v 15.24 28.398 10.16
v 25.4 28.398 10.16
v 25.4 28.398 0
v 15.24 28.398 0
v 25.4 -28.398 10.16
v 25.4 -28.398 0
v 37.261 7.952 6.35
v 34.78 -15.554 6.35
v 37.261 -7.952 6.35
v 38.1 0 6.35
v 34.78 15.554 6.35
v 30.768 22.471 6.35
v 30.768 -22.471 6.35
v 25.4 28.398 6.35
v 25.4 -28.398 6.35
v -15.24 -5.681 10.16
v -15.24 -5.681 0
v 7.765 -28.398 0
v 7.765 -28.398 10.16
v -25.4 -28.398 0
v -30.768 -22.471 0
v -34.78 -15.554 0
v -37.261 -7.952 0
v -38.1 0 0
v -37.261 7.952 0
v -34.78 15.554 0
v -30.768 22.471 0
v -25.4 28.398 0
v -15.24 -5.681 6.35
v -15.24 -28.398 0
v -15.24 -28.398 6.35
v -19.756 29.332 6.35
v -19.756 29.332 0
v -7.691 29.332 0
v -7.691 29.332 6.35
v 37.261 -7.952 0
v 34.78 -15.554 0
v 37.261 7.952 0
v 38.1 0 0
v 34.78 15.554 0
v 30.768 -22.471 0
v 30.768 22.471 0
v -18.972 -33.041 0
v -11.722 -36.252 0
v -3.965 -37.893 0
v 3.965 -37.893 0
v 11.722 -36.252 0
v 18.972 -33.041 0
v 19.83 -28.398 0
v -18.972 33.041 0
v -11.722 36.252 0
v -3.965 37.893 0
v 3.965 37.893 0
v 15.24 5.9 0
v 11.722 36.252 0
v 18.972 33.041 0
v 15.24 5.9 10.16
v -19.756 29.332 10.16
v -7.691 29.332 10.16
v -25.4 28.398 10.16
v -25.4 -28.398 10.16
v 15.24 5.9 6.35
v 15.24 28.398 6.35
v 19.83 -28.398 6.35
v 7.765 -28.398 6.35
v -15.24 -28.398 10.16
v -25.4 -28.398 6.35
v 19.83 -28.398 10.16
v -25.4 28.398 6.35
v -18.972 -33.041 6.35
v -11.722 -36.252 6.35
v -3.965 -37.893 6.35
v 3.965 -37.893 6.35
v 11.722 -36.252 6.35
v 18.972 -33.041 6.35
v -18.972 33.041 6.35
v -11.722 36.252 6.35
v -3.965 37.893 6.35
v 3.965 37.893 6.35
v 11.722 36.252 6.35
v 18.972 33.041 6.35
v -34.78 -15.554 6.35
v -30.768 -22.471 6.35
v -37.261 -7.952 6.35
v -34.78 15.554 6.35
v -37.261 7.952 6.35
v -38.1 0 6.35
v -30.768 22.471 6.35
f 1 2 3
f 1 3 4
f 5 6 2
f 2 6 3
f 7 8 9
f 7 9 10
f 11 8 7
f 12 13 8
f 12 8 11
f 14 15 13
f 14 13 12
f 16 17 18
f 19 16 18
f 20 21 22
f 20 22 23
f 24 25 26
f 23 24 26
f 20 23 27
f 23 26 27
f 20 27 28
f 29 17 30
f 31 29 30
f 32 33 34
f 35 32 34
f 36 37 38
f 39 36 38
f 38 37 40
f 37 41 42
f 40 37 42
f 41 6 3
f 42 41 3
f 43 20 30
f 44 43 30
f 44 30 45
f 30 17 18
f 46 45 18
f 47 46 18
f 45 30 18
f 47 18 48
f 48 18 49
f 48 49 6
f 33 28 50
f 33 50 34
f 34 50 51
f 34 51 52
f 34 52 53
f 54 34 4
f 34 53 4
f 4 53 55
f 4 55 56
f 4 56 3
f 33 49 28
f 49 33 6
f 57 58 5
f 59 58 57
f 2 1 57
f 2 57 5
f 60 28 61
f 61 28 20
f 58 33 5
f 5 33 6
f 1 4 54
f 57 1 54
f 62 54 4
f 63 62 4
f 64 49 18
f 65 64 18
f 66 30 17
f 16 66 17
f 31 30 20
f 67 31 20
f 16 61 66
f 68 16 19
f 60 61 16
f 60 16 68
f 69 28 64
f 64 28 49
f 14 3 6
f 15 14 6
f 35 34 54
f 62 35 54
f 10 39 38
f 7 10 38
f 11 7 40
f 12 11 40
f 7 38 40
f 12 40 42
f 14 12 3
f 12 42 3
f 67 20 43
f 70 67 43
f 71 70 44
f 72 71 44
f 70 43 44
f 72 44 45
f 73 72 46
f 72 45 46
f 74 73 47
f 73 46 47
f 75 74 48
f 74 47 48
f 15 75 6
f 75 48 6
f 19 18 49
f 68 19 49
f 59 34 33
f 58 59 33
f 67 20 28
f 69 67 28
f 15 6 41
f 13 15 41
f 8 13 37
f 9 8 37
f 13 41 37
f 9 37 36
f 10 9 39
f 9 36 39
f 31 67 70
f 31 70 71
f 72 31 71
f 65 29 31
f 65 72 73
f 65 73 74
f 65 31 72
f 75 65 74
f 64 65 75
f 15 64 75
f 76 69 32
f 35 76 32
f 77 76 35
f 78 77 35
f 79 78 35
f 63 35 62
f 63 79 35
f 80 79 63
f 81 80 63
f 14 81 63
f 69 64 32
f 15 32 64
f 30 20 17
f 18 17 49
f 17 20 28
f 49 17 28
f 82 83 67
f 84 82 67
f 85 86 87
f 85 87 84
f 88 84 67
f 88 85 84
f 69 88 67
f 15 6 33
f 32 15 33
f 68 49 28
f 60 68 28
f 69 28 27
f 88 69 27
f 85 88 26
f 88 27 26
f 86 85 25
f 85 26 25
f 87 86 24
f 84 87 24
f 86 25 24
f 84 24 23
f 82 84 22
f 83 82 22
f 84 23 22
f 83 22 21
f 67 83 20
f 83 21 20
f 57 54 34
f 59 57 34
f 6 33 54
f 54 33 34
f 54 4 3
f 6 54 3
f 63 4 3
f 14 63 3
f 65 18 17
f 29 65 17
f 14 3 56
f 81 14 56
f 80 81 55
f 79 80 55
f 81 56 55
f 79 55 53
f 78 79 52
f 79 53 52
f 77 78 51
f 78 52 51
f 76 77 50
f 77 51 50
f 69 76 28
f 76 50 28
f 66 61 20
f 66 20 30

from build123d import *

# Parameters (mm, degrees)
F1_DEPTH = 10.16
F2_DEPTH = 6.35


with BuildPart() as f1:
    # F0 (on Top) → F1 (new body)
    with BuildSketch(Plane.XY):
        Polygon((25.4, -28.398063), (25.4, 28.398063), (15.24, 28.398063), (15.24, 5.900018), (-7.690813, 29.331759), (-19.755813, 29.331759), align=None)
        Polygon((19.829879, -28.398063), (-25.4, 28.398063), (-25.4, -28.398063), (-15.24, -28.398063), (-15.24, -5.681262), (7.764879, -28.398063), align=None)
    extrude(amount=F1_DEPTH)


with BuildPart() as f2:
    # F0 (on Top) → F2 (new body)
    with BuildSketch(Plane.XY):
        with BuildLine():
            Line((15.24, 28.398063), (25.4, 28.398063))
            ThreePointArc((25.4, 28.398063), (0, 38.1), (-25.4, 28.398063))
            Line((-25.4, 28.398063), (19.829879, -28.398063))
            Line((19.829879, -28.398063), (7.764879, -28.398063))
            Line((7.764879, -28.398063), (-15.24, -5.681262))
            Line((-15.24, -5.681262), (-15.24, -28.398063))
            Line((-15.24, -28.398063), (-25.4, -28.398063))
            ThreePointArc((-25.4, -28.398063), (0, -38.1), (25.4, -28.398063))
            Line((25.4, -28.398063), (-19.755813, 29.331759))
            Line((-19.755813, 29.331759), (-7.690813, 29.331759))
            Line((-7.690813, 29.331759), (15.24, 5.900018))
            Line((15.24, 5.900018), (15.24, 28.398063))
        make_face()
        with BuildLine():
            Line((-25.4, -28.398063), (-25.4, 28.398063))
            ThreePointArc((-25.4, 28.398063), (-38.1, 0), (-25.4, -28.398063))
        make_face()
        with BuildLine():
            ThreePointArc((25.4, -28.398063), (34.780382, -15.55426), (38.1, 0))
            ThreePointArc((38.1, 0), (34.780382, 15.55426), (25.4, 28.398063))
            Line((25.4, 28.398063), (25.4, -28.398063))
        make_face()
    extrude(amount=F2_DEPTH)


solid = Compound([f1.part, f2.part])
